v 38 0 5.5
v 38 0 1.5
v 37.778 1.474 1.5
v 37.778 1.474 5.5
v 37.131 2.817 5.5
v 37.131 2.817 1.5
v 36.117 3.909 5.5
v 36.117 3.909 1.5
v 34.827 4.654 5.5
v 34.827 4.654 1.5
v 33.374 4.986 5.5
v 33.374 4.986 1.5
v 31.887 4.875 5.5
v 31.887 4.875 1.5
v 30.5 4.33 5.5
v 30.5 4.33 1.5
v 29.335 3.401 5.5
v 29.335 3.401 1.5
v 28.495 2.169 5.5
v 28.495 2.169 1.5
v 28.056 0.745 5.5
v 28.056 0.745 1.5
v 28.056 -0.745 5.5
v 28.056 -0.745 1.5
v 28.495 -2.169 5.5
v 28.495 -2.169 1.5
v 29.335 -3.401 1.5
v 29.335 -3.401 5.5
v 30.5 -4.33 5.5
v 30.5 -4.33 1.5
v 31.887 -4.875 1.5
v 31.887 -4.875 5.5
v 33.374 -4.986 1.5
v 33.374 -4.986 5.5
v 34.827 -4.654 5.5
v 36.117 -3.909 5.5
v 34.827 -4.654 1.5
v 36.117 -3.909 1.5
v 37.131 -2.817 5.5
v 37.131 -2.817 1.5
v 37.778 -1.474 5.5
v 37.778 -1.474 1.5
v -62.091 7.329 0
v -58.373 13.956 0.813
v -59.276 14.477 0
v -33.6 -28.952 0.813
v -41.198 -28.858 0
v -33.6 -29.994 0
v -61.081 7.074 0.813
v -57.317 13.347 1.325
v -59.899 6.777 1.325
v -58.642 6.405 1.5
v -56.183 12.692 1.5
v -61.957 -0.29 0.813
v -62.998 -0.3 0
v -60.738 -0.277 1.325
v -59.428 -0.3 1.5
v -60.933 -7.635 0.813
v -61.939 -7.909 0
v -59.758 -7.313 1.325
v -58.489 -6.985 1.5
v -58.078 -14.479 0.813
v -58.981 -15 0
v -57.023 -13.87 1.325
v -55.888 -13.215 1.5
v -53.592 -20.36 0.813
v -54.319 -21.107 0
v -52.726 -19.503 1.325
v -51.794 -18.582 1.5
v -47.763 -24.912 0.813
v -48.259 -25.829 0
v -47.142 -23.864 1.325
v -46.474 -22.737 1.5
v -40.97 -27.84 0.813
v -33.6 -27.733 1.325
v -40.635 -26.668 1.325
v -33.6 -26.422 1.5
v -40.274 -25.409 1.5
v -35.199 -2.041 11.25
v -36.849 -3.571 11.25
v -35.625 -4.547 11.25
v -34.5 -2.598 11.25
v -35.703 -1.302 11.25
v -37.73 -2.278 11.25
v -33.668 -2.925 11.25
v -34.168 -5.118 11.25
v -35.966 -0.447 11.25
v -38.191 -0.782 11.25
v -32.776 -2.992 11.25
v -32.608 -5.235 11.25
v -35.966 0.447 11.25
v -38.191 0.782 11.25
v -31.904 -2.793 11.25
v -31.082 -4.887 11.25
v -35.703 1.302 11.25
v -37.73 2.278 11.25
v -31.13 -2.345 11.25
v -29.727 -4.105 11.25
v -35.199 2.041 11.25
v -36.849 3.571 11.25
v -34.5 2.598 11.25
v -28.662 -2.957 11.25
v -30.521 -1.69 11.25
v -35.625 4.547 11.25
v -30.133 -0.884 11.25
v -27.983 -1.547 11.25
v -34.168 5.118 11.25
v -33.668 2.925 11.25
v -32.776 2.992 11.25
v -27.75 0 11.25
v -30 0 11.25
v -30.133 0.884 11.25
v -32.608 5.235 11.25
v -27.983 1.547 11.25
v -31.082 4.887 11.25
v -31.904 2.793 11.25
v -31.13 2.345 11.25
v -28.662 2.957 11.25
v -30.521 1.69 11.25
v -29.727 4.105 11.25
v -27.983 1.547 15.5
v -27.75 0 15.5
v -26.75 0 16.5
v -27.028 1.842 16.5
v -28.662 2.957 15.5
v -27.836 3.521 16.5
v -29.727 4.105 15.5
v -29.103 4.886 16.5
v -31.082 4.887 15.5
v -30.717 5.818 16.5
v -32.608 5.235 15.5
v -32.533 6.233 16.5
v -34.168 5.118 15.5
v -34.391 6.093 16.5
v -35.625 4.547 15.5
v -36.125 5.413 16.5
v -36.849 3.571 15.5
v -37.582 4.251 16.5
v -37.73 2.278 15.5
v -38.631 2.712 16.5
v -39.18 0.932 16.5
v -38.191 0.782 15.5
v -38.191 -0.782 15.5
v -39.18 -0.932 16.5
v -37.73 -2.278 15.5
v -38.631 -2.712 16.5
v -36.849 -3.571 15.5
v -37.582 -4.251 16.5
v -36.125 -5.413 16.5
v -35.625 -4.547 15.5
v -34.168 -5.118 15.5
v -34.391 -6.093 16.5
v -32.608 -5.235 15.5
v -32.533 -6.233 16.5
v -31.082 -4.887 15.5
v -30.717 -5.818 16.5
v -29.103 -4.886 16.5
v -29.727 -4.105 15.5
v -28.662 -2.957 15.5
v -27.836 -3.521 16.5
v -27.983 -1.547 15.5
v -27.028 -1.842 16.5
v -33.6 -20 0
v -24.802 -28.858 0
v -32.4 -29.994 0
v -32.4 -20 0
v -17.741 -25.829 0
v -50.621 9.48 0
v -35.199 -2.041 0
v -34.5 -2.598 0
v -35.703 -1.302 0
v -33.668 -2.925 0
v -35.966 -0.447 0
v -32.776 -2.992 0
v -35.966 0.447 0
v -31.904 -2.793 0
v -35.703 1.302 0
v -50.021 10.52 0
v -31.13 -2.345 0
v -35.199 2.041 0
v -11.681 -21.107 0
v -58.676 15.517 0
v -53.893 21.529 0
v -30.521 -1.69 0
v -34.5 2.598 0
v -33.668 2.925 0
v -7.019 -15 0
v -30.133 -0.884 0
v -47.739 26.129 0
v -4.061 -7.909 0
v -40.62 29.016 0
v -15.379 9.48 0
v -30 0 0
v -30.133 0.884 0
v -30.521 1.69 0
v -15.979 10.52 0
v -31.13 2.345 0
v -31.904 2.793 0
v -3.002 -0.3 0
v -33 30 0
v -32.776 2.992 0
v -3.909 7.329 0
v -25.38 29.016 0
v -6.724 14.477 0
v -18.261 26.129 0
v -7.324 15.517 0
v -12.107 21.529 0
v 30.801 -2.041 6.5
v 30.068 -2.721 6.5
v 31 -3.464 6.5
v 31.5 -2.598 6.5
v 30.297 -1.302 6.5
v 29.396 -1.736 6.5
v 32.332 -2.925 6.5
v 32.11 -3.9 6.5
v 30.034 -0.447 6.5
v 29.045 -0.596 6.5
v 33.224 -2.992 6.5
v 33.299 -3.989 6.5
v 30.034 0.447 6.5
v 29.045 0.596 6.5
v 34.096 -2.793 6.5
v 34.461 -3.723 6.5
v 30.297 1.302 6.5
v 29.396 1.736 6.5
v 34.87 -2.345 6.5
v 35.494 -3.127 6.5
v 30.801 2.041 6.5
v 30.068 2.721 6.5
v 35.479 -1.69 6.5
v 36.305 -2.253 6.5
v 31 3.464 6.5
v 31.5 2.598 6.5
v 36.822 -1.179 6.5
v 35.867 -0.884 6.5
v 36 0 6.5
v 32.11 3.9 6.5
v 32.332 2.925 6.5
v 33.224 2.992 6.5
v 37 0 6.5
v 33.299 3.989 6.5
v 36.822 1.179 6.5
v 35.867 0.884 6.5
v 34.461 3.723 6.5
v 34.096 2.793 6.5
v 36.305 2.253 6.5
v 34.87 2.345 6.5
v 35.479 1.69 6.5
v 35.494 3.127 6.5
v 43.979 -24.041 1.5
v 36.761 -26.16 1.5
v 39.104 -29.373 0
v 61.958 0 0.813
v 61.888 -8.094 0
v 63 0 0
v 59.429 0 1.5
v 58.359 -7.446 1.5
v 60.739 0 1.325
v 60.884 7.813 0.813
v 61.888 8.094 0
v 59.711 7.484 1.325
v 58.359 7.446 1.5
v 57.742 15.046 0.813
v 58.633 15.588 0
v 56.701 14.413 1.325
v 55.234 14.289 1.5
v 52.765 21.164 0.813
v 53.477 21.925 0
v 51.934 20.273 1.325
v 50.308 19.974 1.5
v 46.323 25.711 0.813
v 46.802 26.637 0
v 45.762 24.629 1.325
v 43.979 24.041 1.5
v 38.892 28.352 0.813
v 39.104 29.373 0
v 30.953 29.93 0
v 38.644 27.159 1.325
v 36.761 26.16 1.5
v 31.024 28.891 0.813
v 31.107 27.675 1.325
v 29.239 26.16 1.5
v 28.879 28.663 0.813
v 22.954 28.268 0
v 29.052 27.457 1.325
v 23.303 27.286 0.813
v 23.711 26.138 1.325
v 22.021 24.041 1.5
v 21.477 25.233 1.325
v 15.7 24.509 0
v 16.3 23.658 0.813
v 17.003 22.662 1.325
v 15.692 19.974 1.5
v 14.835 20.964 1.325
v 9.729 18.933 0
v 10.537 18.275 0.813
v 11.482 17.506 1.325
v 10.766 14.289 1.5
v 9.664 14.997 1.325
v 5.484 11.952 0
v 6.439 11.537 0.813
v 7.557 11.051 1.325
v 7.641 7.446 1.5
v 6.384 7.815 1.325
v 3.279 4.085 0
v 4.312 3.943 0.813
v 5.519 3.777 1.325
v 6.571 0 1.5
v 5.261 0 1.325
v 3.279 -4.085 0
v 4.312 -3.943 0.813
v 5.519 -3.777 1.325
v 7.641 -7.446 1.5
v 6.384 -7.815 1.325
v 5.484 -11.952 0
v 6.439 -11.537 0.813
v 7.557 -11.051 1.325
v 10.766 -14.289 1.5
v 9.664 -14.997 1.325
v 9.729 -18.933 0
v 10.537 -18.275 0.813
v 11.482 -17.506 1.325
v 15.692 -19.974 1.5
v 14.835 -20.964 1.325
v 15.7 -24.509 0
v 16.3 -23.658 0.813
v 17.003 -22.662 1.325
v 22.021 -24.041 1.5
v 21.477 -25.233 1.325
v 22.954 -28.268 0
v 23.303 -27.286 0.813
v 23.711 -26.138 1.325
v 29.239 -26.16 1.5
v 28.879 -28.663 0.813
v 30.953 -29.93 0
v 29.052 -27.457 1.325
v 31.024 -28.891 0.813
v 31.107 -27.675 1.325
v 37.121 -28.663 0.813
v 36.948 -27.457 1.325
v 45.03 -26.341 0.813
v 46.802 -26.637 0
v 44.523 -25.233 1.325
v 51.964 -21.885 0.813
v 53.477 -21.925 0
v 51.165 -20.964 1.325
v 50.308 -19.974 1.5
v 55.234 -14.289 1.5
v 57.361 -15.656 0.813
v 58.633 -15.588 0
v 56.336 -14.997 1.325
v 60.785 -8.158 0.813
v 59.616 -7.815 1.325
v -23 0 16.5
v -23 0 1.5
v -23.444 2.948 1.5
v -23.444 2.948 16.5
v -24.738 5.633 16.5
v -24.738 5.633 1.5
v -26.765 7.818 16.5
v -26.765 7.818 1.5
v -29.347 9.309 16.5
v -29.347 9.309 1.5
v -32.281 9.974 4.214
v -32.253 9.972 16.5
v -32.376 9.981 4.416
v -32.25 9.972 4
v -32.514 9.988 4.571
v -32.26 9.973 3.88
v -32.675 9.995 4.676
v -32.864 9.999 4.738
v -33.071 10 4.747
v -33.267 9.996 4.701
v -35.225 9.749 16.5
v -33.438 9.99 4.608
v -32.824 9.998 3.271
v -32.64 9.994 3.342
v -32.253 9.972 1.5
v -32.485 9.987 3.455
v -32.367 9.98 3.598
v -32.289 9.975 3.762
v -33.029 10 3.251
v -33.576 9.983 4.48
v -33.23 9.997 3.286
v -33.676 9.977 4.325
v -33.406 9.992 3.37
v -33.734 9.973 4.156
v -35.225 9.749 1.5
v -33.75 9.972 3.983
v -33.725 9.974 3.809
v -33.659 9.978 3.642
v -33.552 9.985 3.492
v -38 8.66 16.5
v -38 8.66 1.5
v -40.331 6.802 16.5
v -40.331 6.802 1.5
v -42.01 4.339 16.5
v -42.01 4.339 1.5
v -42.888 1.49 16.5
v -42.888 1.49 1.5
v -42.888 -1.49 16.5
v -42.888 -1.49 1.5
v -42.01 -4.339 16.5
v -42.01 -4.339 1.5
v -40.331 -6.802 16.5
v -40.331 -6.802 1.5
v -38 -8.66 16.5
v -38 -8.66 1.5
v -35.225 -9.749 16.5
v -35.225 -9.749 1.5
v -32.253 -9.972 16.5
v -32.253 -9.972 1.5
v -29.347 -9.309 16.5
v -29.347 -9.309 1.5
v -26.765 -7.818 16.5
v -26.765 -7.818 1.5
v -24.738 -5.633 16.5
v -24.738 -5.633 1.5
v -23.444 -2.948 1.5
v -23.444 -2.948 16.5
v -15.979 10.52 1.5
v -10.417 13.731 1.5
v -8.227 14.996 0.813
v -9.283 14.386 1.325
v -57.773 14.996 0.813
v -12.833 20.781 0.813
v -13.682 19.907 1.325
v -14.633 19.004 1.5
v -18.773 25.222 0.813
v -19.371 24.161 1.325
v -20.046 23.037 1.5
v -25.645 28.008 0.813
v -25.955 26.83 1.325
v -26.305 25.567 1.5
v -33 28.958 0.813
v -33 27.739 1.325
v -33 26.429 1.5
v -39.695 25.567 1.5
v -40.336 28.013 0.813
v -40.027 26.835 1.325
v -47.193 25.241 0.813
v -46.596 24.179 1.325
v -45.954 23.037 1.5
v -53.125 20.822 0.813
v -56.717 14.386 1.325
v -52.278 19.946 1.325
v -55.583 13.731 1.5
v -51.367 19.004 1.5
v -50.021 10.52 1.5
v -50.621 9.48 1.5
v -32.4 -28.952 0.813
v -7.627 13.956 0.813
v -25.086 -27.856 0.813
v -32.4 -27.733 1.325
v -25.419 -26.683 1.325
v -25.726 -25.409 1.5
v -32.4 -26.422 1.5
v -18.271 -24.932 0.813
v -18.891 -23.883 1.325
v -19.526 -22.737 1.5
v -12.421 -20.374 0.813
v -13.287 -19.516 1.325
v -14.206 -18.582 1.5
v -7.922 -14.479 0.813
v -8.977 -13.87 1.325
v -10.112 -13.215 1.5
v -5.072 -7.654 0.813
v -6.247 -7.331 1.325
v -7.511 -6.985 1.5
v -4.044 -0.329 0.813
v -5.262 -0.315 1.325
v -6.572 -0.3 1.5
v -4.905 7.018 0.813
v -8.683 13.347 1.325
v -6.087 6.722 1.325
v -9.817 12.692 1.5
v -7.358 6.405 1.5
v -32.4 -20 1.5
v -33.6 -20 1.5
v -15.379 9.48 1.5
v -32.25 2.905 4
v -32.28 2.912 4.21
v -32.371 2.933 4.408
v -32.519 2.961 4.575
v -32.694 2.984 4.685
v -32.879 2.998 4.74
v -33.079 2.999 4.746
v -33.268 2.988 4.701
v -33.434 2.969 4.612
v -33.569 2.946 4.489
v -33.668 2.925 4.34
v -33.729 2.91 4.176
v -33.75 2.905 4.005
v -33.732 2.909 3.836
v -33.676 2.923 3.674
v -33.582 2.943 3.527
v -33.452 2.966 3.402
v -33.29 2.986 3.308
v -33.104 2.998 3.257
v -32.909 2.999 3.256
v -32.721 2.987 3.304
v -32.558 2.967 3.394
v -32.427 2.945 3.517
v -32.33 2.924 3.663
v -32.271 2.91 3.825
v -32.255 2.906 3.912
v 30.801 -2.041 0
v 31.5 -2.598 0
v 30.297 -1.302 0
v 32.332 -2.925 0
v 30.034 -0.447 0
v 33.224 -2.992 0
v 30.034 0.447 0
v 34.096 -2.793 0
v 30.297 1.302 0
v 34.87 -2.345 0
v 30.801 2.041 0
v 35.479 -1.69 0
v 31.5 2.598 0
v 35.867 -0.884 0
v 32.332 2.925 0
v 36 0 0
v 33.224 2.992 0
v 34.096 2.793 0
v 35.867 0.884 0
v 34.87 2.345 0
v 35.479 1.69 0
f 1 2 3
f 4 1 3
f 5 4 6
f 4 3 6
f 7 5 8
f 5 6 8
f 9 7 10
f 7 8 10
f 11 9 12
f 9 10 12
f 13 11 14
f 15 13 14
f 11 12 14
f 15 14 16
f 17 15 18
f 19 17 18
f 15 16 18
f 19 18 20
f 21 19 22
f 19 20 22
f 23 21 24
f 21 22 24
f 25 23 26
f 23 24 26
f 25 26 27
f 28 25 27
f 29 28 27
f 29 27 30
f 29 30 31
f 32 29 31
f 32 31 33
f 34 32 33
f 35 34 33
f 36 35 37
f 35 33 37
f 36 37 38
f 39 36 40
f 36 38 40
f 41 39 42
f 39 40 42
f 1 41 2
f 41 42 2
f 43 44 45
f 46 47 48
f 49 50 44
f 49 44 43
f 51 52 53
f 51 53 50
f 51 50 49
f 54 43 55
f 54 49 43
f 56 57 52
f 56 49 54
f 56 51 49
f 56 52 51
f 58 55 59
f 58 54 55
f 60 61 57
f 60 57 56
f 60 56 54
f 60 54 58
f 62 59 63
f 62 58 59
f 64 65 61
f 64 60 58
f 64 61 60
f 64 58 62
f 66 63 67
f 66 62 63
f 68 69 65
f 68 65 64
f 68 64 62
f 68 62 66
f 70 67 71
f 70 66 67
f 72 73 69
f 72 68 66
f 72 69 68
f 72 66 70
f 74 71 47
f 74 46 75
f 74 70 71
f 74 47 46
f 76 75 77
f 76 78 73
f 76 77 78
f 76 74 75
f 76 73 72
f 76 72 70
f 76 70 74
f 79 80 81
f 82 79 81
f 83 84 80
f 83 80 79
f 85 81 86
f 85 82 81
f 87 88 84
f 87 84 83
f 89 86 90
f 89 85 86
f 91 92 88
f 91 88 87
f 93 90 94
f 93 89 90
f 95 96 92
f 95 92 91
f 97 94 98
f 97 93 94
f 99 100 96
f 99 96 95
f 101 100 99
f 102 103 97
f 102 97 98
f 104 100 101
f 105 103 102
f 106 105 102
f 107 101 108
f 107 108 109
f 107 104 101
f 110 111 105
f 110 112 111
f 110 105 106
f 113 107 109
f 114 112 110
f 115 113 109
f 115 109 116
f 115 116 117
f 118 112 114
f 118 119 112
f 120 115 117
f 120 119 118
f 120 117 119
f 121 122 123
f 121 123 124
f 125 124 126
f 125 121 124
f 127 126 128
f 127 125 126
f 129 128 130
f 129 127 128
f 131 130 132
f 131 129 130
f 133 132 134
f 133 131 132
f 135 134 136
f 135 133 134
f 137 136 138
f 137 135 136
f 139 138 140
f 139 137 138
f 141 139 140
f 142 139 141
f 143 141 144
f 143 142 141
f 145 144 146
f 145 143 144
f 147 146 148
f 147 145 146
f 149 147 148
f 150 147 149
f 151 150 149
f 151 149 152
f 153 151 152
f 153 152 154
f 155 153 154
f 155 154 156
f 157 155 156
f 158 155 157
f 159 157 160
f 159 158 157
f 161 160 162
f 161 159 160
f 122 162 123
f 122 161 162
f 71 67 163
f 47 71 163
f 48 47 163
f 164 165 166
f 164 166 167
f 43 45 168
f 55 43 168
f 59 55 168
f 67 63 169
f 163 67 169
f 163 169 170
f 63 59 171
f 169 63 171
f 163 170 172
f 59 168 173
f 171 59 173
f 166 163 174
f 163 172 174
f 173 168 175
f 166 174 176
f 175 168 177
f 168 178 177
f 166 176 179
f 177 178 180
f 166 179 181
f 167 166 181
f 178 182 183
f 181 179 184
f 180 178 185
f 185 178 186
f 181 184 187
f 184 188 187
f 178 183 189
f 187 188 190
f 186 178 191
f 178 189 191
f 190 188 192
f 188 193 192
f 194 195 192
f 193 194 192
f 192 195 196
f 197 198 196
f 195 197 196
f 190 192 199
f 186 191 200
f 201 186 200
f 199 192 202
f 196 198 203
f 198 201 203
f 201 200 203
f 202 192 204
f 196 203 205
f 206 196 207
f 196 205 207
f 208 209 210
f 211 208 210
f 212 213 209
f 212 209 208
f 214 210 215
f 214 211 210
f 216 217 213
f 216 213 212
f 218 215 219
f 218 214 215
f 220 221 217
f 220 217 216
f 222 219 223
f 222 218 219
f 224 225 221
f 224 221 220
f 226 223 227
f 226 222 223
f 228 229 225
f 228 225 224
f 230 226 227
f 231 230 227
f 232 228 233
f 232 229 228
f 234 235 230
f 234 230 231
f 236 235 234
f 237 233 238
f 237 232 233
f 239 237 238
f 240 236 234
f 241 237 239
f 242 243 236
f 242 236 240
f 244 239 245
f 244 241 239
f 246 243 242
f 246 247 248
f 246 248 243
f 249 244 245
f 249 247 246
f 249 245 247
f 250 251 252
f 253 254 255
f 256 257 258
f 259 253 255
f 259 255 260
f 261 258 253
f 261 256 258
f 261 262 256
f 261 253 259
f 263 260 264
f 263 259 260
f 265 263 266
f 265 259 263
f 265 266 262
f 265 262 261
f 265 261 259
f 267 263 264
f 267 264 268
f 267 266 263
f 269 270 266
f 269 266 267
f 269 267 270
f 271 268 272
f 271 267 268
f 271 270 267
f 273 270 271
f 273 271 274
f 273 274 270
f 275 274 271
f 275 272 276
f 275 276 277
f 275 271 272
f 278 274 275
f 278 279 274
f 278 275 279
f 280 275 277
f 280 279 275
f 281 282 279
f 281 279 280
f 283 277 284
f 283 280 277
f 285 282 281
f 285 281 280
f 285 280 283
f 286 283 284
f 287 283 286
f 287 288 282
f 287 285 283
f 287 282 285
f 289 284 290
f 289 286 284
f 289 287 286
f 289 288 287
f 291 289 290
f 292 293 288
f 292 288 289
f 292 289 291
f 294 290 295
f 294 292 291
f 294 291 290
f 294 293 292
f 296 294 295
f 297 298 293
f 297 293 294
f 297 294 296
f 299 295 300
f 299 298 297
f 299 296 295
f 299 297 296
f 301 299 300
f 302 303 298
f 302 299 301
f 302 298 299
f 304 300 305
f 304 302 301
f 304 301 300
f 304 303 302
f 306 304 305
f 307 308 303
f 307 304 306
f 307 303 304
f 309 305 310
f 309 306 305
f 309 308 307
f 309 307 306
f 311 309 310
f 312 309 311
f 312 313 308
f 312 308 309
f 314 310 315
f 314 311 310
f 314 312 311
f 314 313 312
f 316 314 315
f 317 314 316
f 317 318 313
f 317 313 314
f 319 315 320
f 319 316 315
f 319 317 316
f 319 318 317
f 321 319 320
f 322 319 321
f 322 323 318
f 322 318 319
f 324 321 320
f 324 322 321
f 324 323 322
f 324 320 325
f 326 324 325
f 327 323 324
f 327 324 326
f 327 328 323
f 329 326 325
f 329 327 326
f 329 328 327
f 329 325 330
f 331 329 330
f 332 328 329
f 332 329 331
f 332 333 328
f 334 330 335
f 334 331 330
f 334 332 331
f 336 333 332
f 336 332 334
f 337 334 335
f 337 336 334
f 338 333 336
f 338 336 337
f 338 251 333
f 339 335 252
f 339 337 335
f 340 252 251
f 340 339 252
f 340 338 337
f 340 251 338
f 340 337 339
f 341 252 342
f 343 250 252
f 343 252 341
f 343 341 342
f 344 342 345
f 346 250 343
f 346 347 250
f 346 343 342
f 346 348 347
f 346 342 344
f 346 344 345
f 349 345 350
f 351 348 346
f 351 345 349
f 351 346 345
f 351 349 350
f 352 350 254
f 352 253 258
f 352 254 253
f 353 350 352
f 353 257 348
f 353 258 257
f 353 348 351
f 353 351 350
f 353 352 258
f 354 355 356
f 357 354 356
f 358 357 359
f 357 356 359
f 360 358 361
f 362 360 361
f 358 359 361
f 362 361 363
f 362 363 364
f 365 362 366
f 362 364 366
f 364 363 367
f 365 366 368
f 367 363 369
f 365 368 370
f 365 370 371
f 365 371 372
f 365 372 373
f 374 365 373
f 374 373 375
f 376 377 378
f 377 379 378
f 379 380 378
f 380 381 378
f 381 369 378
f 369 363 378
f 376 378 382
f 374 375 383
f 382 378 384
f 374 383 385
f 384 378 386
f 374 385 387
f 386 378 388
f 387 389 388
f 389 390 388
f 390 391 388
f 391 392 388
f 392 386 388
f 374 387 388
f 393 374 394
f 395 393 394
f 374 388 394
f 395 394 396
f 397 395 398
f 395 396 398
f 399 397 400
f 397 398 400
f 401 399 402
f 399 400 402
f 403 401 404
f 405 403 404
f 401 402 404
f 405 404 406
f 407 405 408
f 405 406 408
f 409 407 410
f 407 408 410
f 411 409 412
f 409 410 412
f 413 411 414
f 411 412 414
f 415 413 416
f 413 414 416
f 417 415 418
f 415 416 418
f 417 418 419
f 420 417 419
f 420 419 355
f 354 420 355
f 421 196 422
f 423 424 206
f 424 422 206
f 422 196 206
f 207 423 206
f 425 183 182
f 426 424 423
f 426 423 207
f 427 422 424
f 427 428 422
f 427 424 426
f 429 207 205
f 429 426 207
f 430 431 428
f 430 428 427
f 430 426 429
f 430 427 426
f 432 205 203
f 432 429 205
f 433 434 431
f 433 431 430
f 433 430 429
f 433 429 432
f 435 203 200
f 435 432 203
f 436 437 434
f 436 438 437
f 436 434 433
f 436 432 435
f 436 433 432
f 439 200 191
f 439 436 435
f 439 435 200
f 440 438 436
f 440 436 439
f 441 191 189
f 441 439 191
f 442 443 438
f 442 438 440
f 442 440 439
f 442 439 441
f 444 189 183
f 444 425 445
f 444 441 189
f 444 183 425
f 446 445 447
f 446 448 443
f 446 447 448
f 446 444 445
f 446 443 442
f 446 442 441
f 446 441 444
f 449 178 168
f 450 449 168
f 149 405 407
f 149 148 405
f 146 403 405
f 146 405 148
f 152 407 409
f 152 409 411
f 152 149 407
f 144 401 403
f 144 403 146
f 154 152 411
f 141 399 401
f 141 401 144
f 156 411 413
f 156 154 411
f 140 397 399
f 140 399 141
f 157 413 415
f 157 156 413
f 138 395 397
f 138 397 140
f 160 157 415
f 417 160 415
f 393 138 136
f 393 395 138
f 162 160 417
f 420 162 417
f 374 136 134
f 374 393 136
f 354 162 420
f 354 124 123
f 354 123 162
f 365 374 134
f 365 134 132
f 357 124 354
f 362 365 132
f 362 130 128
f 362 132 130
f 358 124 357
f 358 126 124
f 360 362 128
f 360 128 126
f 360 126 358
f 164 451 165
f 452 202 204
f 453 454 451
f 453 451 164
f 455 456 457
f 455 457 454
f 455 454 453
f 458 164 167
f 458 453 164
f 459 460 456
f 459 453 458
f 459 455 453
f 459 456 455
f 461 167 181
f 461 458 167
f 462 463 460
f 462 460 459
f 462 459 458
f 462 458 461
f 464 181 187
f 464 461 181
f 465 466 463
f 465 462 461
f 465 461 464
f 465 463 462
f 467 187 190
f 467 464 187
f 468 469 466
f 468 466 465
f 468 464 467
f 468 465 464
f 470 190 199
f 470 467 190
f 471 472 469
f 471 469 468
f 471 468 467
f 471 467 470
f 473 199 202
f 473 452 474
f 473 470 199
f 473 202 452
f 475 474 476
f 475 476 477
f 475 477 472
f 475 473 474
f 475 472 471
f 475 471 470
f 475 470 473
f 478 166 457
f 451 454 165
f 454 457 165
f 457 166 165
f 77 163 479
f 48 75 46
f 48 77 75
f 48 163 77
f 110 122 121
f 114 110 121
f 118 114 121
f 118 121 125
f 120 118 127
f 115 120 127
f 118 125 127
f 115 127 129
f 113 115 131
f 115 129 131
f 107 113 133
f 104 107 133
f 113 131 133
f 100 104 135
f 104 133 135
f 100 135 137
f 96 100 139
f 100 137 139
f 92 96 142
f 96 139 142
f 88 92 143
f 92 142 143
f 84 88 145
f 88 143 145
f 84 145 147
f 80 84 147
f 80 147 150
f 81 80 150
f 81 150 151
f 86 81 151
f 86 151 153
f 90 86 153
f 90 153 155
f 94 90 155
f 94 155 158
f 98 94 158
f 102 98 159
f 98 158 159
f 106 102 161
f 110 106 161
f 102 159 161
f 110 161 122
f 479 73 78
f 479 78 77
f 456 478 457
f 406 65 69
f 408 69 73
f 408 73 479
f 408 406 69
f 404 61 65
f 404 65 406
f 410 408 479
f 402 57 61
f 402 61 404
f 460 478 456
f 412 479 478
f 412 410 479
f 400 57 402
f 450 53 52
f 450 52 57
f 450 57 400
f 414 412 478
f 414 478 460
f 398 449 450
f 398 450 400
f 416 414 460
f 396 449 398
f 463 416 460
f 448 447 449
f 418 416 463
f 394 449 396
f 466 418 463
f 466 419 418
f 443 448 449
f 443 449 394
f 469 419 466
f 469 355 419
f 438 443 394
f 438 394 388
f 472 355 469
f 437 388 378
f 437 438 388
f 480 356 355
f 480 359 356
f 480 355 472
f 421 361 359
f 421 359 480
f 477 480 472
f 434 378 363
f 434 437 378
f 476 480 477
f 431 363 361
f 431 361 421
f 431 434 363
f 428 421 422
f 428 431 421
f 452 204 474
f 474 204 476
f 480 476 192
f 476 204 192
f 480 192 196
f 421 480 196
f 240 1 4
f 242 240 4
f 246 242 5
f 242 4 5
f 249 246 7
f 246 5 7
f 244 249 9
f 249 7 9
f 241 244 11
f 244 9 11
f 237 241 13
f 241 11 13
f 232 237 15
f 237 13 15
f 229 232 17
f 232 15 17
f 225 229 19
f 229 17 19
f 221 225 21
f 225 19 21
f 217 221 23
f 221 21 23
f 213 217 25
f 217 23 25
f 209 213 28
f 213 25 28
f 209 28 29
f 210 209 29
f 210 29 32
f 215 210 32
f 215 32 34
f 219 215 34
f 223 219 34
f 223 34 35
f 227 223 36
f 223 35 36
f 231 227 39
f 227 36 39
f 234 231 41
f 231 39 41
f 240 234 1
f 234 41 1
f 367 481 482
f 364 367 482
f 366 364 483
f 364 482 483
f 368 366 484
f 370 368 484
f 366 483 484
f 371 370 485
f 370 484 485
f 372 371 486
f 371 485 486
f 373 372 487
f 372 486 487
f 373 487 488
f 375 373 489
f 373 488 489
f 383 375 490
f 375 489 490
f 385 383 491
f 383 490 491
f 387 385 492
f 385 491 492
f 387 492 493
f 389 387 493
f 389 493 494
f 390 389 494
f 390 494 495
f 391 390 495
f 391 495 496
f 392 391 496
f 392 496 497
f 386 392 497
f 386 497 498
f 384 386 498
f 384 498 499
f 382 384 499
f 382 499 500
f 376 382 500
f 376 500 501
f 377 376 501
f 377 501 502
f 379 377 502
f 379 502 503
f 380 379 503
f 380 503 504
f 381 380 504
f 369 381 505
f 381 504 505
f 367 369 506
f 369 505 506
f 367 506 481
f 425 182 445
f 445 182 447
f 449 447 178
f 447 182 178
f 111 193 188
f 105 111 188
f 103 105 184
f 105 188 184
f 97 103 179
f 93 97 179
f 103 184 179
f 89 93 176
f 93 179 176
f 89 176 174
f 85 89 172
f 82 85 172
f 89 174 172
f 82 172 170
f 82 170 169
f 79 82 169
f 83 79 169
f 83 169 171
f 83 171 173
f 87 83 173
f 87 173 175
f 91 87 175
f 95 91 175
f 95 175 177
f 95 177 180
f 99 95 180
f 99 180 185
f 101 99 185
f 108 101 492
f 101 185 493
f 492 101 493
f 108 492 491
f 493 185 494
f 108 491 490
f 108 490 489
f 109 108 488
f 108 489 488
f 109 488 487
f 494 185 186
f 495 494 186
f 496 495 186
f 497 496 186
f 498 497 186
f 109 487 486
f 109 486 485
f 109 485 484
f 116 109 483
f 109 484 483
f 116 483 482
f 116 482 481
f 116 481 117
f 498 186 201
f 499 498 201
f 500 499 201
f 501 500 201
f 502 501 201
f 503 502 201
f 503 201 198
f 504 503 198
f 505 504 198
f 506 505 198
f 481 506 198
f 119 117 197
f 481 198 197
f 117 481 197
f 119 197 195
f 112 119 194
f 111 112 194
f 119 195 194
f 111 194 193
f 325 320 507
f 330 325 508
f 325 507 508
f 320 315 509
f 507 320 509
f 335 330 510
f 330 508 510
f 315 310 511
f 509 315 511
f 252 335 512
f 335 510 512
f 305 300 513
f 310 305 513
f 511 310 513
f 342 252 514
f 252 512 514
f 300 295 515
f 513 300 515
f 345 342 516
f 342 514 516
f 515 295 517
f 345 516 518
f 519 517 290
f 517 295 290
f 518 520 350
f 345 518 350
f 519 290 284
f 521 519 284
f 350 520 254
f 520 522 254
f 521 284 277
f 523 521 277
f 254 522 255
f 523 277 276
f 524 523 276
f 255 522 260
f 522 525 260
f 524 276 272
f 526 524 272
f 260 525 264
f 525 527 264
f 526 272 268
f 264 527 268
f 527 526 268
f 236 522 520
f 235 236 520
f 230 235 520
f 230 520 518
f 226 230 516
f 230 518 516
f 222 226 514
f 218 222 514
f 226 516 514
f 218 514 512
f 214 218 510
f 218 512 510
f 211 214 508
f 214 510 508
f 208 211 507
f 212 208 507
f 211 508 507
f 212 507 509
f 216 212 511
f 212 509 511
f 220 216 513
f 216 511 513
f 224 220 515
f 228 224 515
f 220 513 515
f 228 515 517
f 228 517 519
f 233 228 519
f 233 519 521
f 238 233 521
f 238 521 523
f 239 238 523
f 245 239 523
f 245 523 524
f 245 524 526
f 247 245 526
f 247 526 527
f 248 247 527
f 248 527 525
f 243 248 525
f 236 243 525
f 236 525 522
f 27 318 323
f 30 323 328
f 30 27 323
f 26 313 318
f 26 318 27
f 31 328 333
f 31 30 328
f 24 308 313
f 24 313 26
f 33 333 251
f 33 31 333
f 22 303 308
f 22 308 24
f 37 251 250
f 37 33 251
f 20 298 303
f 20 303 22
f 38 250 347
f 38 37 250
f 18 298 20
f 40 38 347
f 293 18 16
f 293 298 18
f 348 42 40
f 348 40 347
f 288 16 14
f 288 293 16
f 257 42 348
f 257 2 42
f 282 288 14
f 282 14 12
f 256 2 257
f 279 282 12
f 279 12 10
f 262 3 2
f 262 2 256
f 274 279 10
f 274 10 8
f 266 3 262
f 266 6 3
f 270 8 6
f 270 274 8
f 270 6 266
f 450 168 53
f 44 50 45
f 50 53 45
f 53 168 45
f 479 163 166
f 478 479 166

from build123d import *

# Parameters (mm, degrees)
F0_R       = 30
F1_DEPTH   = 1.5
F3_R       = 10
F4_DEPTH   = 15
F5_R       = 5
F6_DEPTH   = 5
F7_R       = 5.25
F8_DEPTH   = 5.25
F9_R       = 3
F11_DEPTH  = 25
F10_R      = 3
F12_DEPTH  = 25
F13_R      = 0.75
F14_DEPTH  = 30.001
F15_W      = 1.2
F15_H      = 20
F16_DEPTH  = 25
F17_SIZE   = 1
F17_2_SIZE = 1


# Not quite as in the source:
# - a fillet or chamfer that OpenCascade refuses, or shapes differently, is made with other operations: its cross-section is extruded or revolved along the edge and cut away or added


with BuildPart() as f1:
    # F0 (on Top) → F1 (new body)
    with BuildSketch(Plane.XY):
        with Locations((-33, 0)):
            Circle(F0_R)
    extrude(amount=F1_DEPTH)

    # F2: fillet of radius 5 on 1 edges, made by hand

    # F2_s1 → F2_t2 (revolve, cut)
    with BuildSketch(Plane.XZ):
        with BuildLine():
            ThreePointArc((-3, 0), (-4.6342225412, 1.1097722286), (-6.5707142143, 1.5))
            Line((-6.5707142143, 1.5), (-3, 1.5))
            Line((-3, 1.5), (-3, 0))
        make_face()
    revolve(axis=Axis((-33, 0, 1.5), (0, 0, 1)), mode=Mode.SUBTRACT)

    # F3 (on face) → F4 (join)
    with BuildSketch(Plane.XY.offset(1.5)):
        with Locations((-33, 0)):
            Circle(F3_R)
    extrude(amount=F4_DEPTH)

    # F7 (on face) → F8 (cut)
    with BuildSketch(Plane.XY.offset(16.5)):
        with Locations((-33, 0)):
            Circle(F7_R)
    extrude(amount=-F8_DEPTH, mode=Mode.SUBTRACT)

    # F10 (on face) → F12 (cut)
    with BuildSketch(Plane(origin=(0, 0, 0), x_dir=(1, 0, 0), z_dir=(0, 0, -1))):
        with Locations((-33, 0)):
            Circle(F10_R)
    extrude(amount=-F12_DEPTH, mode=Mode.SUBTRACT)

    # F13 (on Front) → F14 (cut, through all)
    with BuildSketch(Plane.XZ):
        with Locations((-33, 4)):
            Circle(F13_R)
    extrude(amount=-F14_DEPTH, mode=Mode.SUBTRACT)

    # F15 (on face) → F16 (cut)
    with BuildSketch(Plane(origin=(0, 0, 0), x_dir=(1, 0, 0), z_dir=(0, 0, -1))):
        with Locations((-33, 30)):
            Rectangle(F15_W, F15_H)
        Polygon((-67.3410161514, -20.5196152423), (-50.0205080757, -10.5196152423), (-50.6205080757, -9.4803847577), (-67.9410161514, -19.4803847577), align=None)
        Polygon((1.9410161514, -19.4803847577), (-15.3794919243, -9.4803847577), (-15.9794919243, -10.5196152423), (1.3410161514, -20.5196152423), align=None)
    extrude(amount=-F16_DEPTH, mode=Mode.SUBTRACT)

    # F17
    f17_edges = [f1.edges().sort_by_distance(p)[0] for p in [
        (-38.25, 0, 16.5),
    ]]
    chamfer(f17_edges, length=F17_SIZE)


with BuildPart() as f1b:
    # F0 (on Top) → F1, piece 2 (new body)
    with BuildSketch(Plane.XY):
        with Locations((33, 0)):
            Circle(F0_R)
    extrude(amount=F1_DEPTH)

    # F2#2: fillet of radius 5 on 1 edges, made by hand

    # F2_2_s1 → F2_2_t2 (revolve, cut)
    with BuildSketch(Plane.XZ):
        with BuildLine():
            ThreePointArc((63, 0), (61.3657774588, 1.1097722286), (59.4292857857, 1.5))
            Line((59.4292857857, 1.5), (63, 1.5))
            Line((63, 1.5), (63, 0))
        make_face()
    revolve(axis=Axis((33, 0, 1.5), (0, 0, 1)), mode=Mode.SUBTRACT)

    # F5 (on face) → F6 (join)
    with BuildSketch(Plane.XY.offset(1.5)):
        with Locations((33, 0)):
            Circle(F5_R)
    extrude(amount=F6_DEPTH)

    # F9 (on face) → F11 (cut)
    with BuildSketch(Plane(origin=(0, 0, 0), x_dir=(1, 0, 0), z_dir=(0, 0, -1))):
        with Locations((33, 0)):
            Circle(F9_R)
    extrude(amount=-F11_DEPTH, mode=Mode.SUBTRACT)

    # F17#2
    f17_2_edges = [f1b.edges().sort_by_distance(p)[0] for p in [
        (28, 0, 6.5),
    ]]
    chamfer(f17_2_edges, length=F17_2_SIZE)


solid = Compound([f1.part, f1b.part])
